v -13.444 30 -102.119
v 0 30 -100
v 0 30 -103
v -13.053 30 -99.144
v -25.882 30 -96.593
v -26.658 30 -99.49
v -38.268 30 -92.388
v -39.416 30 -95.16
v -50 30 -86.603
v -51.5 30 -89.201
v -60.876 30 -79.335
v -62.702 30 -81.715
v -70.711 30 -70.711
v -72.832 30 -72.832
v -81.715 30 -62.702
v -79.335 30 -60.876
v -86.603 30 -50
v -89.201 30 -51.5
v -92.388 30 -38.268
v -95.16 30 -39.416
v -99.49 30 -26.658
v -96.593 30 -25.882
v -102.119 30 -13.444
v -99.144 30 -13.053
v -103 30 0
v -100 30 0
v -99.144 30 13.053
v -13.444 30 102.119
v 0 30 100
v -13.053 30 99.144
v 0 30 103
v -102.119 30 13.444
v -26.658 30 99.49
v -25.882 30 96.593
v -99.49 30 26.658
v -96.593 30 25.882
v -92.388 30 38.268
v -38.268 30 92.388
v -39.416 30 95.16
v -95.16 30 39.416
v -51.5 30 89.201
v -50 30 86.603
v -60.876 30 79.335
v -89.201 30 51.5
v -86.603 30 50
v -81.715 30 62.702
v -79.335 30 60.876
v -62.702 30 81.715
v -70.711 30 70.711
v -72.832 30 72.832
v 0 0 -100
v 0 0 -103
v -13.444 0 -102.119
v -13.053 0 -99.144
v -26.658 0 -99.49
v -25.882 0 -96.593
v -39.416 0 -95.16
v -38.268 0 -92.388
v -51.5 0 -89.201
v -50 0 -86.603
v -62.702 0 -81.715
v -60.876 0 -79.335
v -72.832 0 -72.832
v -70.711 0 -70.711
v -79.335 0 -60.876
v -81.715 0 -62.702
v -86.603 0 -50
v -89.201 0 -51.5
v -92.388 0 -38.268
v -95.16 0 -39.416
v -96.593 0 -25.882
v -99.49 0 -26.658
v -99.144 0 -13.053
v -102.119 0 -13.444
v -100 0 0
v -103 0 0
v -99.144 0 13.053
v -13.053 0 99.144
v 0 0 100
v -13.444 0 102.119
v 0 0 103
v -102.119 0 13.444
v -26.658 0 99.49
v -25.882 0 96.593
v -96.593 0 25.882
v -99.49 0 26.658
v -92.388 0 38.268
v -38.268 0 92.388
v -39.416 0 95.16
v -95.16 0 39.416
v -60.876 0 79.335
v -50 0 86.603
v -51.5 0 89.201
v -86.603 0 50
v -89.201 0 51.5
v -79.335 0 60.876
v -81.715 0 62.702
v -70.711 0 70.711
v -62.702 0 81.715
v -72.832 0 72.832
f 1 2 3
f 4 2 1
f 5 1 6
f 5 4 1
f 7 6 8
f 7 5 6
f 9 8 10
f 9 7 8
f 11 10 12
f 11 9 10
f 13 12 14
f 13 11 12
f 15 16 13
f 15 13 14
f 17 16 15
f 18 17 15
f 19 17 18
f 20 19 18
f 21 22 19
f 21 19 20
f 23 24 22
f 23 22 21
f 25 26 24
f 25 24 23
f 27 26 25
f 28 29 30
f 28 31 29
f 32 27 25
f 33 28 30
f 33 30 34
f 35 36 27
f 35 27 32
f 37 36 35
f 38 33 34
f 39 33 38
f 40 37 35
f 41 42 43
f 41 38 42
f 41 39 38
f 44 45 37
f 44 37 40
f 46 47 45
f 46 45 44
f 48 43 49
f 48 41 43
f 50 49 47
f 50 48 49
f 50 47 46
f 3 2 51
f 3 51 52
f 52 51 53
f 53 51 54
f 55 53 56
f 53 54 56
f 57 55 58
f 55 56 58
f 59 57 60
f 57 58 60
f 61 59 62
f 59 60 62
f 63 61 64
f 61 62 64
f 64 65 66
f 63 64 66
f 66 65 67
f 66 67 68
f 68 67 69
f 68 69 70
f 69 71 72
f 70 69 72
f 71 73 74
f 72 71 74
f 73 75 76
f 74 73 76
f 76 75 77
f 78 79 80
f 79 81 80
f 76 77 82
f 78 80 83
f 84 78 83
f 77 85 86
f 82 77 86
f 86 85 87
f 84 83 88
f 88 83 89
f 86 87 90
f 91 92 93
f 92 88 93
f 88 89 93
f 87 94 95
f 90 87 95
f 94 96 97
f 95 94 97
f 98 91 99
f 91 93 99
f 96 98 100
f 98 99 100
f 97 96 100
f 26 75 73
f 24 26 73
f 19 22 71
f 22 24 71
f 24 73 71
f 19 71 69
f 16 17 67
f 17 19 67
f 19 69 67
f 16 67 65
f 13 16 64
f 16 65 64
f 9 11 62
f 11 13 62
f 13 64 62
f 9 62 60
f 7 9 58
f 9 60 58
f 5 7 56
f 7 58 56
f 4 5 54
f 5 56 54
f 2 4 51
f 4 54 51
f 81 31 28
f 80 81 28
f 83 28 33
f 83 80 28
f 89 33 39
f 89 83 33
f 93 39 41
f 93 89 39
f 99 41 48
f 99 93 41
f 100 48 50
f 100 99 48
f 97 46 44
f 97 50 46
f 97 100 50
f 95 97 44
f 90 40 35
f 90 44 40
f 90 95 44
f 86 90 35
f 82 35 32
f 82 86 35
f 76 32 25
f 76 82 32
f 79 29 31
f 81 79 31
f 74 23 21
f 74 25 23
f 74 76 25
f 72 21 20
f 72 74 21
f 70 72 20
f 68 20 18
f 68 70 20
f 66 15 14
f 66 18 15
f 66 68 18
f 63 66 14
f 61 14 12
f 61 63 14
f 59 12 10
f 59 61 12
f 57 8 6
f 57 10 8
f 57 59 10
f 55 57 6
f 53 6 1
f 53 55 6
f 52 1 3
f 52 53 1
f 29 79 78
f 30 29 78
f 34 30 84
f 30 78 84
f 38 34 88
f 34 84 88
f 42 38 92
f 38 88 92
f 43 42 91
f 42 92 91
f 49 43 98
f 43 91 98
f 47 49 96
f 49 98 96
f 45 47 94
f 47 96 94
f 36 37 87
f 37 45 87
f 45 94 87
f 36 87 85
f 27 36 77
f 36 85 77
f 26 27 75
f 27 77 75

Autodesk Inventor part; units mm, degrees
ref_plane "YZ Plane" through (0, 0, 0) normal (1, 0, 0) x (0, 1, 0)
ref_plane "XZ Plane" through (0, 0, 0) normal (0, 1, 0) x (-1, 0, 0)
ref_plane "XY Plane" through (0, 0, 0) normal (0, 0, 1) x (1, 0, 0)
sketch "Sketch1" plane through (0, 0, 0) normal (0, 1, 0) x (-1, 0, 0)
  circle A0 centre (0, 0) radius 100
  circle A1 centre (0, 0) radius 103
  line L0 (0, -100) -> (0, -103)
  line L1 (0, 100) -> (0, 103)
  point P0 (0, 101.5)
  dimension "d0" = 200
  dimension "d1" = 206
extrude "Extrusion1" add sketch "Sketch1" along normal blind 30 contours A0 L1 A1 L0 picked at (101.4211, -8.8323)
properties part number "R10_CM_CIRCULO"
